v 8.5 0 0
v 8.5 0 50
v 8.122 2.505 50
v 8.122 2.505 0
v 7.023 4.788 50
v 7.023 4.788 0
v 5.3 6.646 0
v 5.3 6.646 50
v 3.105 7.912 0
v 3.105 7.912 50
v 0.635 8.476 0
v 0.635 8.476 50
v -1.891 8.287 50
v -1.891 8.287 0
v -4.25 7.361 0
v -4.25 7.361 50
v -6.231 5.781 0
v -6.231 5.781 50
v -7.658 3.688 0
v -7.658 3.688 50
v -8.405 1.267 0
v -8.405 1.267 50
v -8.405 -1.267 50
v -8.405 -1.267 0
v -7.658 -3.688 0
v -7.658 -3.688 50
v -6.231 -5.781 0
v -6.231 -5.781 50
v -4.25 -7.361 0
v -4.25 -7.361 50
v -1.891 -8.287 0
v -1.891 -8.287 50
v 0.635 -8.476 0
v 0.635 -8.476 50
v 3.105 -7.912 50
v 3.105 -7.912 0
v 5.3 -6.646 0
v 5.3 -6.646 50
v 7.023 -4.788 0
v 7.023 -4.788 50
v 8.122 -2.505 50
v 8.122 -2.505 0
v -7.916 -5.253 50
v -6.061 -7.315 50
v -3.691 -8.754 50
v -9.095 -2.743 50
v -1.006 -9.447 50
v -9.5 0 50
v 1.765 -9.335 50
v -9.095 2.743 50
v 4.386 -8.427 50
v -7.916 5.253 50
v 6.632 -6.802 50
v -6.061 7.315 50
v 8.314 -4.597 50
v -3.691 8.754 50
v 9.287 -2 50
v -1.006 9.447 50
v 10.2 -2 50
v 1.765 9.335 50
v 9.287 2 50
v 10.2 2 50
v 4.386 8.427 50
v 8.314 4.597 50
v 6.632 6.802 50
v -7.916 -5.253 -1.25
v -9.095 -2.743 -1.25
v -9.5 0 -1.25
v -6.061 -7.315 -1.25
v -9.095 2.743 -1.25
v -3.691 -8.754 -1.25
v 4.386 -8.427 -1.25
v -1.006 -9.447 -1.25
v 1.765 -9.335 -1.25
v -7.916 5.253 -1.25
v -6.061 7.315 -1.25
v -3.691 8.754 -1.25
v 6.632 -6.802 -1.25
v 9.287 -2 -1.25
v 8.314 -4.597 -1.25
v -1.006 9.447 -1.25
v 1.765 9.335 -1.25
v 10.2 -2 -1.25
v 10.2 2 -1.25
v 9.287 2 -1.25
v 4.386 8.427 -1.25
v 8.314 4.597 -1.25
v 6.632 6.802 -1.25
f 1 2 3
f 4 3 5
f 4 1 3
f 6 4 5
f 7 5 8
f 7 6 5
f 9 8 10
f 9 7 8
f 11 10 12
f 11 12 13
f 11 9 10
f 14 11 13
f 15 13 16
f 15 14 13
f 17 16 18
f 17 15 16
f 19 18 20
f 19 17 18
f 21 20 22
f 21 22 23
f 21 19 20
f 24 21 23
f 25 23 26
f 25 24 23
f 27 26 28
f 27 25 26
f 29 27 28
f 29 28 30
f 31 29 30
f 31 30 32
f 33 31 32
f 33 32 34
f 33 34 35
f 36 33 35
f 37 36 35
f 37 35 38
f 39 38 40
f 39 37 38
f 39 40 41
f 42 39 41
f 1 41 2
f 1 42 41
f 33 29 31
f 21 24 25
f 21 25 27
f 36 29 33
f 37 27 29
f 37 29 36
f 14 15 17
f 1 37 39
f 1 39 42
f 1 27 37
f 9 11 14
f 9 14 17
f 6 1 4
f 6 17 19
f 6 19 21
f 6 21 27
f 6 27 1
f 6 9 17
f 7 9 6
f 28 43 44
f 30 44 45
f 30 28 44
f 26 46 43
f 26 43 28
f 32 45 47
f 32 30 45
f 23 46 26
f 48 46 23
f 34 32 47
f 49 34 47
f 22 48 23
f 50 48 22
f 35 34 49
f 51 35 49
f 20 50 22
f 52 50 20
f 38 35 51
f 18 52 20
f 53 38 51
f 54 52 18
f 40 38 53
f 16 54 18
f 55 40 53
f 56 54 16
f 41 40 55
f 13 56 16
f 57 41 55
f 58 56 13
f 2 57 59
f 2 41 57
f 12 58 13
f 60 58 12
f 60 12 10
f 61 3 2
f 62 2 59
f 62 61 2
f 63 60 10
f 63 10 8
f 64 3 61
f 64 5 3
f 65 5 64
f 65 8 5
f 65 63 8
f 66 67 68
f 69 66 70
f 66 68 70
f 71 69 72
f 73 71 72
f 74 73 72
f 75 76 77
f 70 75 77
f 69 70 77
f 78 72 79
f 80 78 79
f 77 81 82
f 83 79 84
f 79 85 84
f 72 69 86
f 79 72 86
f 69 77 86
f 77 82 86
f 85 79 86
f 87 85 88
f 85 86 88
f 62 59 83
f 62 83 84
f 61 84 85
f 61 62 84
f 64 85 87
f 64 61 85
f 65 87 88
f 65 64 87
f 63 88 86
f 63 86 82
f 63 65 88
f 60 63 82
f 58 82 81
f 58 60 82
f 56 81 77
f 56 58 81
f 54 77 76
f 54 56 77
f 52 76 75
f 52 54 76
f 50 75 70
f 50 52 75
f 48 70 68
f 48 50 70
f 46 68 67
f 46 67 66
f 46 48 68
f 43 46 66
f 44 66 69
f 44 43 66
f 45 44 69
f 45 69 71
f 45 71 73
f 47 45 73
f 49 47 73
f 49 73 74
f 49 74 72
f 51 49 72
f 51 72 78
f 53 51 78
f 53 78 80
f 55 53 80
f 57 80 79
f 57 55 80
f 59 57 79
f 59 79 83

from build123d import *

# Parameters (mm, degrees)
F0_R     = 8.5
F1_DEPTH = 50
F2_DEPTH = 1.25


with BuildPart() as f1:
    # F0 (on Top) → F1 (new body)
    with BuildSketch(Plane.XY):
        with BuildLine():
            ThreePointArc((9.2870878105, -2), (9.4466219941, -1.0056504861), (9.5, 0))
            ThreePointArc((9.5, 0), (9.4466219941, 1.0056504861), (9.2870878105, 2))
            Line((9.2870878105, 2), (8.8004730493, 2))
            Line((8.8004730493, 2), (8.8004730493, -2))
            Line((8.8004730493, -2), (9.2870878105, -2))
        make_face()
        with BuildLine():
            ThreePointArc((9.2870878105, 2), (9.4466219941, 1.0056504861), (9.5, 0))
            ThreePointArc((9.5, 0), (9.4466219941, -1.0056504861), (9.2870878105, -2))
            Line((9.2870878105, -2), (10.1995269507, -2))
            Line((10.1995269507, -2), (10.1995269507, 2))
            Line((10.1995269507, 2), (9.2870878105, 2))
        make_face()
        with BuildLine():
            Line((8.8004730493, 2), (9.2870878105, 2))
            ThreePointArc((9.2870878105, 2), (-9.5, 0), (9.2870878105, -2))
            Line((9.2870878105, -2), (8.8004730493, -2))
            Line((8.8004730493, -2), (8.8004730493, 2))
        make_face()
        Circle(F0_R, mode=Mode.SUBTRACT)
    extrude(amount=F1_DEPTH)

    # F0 (on Top) → F2 (join)
    with BuildSketch(Plane.XY):
        with BuildLine():
            Line((8.8004730493, 2), (9.2870878105, 2))
            ThreePointArc((9.2870878105, 2), (-9.5, 0), (9.2870878105, -2))
            Line((9.2870878105, -2), (8.8004730493, -2))
            Line((8.8004730493, -2), (8.8004730493, 2))
        make_face()
        Circle(F0_R, mode=Mode.SUBTRACT)
        Circle(F0_R)
        with BuildLine():
            ThreePointArc((9.2870878105, 2), (9.4466219941, 1.0056504861), (9.5, 0))
            ThreePointArc((9.5, 0), (9.4466219941, -1.0056504861), (9.2870878105, -2))
            Line((9.2870878105, -2), (10.1995269507, -2))
            Line((10.1995269507, -2), (10.1995269507, 2))
            Line((10.1995269507, 2), (9.2870878105, 2))
        make_face()
        with BuildLine():
            ThreePointArc((9.2870878105, -2), (9.4466219941, -1.0056504861), (9.5, 0))
            ThreePointArc((9.5, 0), (9.4466219941, 1.0056504861), (9.2870878105, 2))
            Line((9.2870878105, 2), (8.8004730493, 2))
            Line((8.8004730493, 2), (8.8004730493, -2))
            Line((8.8004730493, -2), (9.2870878105, -2))
        make_face()
    extrude(amount=-F2_DEPTH)


solid = f1.part
